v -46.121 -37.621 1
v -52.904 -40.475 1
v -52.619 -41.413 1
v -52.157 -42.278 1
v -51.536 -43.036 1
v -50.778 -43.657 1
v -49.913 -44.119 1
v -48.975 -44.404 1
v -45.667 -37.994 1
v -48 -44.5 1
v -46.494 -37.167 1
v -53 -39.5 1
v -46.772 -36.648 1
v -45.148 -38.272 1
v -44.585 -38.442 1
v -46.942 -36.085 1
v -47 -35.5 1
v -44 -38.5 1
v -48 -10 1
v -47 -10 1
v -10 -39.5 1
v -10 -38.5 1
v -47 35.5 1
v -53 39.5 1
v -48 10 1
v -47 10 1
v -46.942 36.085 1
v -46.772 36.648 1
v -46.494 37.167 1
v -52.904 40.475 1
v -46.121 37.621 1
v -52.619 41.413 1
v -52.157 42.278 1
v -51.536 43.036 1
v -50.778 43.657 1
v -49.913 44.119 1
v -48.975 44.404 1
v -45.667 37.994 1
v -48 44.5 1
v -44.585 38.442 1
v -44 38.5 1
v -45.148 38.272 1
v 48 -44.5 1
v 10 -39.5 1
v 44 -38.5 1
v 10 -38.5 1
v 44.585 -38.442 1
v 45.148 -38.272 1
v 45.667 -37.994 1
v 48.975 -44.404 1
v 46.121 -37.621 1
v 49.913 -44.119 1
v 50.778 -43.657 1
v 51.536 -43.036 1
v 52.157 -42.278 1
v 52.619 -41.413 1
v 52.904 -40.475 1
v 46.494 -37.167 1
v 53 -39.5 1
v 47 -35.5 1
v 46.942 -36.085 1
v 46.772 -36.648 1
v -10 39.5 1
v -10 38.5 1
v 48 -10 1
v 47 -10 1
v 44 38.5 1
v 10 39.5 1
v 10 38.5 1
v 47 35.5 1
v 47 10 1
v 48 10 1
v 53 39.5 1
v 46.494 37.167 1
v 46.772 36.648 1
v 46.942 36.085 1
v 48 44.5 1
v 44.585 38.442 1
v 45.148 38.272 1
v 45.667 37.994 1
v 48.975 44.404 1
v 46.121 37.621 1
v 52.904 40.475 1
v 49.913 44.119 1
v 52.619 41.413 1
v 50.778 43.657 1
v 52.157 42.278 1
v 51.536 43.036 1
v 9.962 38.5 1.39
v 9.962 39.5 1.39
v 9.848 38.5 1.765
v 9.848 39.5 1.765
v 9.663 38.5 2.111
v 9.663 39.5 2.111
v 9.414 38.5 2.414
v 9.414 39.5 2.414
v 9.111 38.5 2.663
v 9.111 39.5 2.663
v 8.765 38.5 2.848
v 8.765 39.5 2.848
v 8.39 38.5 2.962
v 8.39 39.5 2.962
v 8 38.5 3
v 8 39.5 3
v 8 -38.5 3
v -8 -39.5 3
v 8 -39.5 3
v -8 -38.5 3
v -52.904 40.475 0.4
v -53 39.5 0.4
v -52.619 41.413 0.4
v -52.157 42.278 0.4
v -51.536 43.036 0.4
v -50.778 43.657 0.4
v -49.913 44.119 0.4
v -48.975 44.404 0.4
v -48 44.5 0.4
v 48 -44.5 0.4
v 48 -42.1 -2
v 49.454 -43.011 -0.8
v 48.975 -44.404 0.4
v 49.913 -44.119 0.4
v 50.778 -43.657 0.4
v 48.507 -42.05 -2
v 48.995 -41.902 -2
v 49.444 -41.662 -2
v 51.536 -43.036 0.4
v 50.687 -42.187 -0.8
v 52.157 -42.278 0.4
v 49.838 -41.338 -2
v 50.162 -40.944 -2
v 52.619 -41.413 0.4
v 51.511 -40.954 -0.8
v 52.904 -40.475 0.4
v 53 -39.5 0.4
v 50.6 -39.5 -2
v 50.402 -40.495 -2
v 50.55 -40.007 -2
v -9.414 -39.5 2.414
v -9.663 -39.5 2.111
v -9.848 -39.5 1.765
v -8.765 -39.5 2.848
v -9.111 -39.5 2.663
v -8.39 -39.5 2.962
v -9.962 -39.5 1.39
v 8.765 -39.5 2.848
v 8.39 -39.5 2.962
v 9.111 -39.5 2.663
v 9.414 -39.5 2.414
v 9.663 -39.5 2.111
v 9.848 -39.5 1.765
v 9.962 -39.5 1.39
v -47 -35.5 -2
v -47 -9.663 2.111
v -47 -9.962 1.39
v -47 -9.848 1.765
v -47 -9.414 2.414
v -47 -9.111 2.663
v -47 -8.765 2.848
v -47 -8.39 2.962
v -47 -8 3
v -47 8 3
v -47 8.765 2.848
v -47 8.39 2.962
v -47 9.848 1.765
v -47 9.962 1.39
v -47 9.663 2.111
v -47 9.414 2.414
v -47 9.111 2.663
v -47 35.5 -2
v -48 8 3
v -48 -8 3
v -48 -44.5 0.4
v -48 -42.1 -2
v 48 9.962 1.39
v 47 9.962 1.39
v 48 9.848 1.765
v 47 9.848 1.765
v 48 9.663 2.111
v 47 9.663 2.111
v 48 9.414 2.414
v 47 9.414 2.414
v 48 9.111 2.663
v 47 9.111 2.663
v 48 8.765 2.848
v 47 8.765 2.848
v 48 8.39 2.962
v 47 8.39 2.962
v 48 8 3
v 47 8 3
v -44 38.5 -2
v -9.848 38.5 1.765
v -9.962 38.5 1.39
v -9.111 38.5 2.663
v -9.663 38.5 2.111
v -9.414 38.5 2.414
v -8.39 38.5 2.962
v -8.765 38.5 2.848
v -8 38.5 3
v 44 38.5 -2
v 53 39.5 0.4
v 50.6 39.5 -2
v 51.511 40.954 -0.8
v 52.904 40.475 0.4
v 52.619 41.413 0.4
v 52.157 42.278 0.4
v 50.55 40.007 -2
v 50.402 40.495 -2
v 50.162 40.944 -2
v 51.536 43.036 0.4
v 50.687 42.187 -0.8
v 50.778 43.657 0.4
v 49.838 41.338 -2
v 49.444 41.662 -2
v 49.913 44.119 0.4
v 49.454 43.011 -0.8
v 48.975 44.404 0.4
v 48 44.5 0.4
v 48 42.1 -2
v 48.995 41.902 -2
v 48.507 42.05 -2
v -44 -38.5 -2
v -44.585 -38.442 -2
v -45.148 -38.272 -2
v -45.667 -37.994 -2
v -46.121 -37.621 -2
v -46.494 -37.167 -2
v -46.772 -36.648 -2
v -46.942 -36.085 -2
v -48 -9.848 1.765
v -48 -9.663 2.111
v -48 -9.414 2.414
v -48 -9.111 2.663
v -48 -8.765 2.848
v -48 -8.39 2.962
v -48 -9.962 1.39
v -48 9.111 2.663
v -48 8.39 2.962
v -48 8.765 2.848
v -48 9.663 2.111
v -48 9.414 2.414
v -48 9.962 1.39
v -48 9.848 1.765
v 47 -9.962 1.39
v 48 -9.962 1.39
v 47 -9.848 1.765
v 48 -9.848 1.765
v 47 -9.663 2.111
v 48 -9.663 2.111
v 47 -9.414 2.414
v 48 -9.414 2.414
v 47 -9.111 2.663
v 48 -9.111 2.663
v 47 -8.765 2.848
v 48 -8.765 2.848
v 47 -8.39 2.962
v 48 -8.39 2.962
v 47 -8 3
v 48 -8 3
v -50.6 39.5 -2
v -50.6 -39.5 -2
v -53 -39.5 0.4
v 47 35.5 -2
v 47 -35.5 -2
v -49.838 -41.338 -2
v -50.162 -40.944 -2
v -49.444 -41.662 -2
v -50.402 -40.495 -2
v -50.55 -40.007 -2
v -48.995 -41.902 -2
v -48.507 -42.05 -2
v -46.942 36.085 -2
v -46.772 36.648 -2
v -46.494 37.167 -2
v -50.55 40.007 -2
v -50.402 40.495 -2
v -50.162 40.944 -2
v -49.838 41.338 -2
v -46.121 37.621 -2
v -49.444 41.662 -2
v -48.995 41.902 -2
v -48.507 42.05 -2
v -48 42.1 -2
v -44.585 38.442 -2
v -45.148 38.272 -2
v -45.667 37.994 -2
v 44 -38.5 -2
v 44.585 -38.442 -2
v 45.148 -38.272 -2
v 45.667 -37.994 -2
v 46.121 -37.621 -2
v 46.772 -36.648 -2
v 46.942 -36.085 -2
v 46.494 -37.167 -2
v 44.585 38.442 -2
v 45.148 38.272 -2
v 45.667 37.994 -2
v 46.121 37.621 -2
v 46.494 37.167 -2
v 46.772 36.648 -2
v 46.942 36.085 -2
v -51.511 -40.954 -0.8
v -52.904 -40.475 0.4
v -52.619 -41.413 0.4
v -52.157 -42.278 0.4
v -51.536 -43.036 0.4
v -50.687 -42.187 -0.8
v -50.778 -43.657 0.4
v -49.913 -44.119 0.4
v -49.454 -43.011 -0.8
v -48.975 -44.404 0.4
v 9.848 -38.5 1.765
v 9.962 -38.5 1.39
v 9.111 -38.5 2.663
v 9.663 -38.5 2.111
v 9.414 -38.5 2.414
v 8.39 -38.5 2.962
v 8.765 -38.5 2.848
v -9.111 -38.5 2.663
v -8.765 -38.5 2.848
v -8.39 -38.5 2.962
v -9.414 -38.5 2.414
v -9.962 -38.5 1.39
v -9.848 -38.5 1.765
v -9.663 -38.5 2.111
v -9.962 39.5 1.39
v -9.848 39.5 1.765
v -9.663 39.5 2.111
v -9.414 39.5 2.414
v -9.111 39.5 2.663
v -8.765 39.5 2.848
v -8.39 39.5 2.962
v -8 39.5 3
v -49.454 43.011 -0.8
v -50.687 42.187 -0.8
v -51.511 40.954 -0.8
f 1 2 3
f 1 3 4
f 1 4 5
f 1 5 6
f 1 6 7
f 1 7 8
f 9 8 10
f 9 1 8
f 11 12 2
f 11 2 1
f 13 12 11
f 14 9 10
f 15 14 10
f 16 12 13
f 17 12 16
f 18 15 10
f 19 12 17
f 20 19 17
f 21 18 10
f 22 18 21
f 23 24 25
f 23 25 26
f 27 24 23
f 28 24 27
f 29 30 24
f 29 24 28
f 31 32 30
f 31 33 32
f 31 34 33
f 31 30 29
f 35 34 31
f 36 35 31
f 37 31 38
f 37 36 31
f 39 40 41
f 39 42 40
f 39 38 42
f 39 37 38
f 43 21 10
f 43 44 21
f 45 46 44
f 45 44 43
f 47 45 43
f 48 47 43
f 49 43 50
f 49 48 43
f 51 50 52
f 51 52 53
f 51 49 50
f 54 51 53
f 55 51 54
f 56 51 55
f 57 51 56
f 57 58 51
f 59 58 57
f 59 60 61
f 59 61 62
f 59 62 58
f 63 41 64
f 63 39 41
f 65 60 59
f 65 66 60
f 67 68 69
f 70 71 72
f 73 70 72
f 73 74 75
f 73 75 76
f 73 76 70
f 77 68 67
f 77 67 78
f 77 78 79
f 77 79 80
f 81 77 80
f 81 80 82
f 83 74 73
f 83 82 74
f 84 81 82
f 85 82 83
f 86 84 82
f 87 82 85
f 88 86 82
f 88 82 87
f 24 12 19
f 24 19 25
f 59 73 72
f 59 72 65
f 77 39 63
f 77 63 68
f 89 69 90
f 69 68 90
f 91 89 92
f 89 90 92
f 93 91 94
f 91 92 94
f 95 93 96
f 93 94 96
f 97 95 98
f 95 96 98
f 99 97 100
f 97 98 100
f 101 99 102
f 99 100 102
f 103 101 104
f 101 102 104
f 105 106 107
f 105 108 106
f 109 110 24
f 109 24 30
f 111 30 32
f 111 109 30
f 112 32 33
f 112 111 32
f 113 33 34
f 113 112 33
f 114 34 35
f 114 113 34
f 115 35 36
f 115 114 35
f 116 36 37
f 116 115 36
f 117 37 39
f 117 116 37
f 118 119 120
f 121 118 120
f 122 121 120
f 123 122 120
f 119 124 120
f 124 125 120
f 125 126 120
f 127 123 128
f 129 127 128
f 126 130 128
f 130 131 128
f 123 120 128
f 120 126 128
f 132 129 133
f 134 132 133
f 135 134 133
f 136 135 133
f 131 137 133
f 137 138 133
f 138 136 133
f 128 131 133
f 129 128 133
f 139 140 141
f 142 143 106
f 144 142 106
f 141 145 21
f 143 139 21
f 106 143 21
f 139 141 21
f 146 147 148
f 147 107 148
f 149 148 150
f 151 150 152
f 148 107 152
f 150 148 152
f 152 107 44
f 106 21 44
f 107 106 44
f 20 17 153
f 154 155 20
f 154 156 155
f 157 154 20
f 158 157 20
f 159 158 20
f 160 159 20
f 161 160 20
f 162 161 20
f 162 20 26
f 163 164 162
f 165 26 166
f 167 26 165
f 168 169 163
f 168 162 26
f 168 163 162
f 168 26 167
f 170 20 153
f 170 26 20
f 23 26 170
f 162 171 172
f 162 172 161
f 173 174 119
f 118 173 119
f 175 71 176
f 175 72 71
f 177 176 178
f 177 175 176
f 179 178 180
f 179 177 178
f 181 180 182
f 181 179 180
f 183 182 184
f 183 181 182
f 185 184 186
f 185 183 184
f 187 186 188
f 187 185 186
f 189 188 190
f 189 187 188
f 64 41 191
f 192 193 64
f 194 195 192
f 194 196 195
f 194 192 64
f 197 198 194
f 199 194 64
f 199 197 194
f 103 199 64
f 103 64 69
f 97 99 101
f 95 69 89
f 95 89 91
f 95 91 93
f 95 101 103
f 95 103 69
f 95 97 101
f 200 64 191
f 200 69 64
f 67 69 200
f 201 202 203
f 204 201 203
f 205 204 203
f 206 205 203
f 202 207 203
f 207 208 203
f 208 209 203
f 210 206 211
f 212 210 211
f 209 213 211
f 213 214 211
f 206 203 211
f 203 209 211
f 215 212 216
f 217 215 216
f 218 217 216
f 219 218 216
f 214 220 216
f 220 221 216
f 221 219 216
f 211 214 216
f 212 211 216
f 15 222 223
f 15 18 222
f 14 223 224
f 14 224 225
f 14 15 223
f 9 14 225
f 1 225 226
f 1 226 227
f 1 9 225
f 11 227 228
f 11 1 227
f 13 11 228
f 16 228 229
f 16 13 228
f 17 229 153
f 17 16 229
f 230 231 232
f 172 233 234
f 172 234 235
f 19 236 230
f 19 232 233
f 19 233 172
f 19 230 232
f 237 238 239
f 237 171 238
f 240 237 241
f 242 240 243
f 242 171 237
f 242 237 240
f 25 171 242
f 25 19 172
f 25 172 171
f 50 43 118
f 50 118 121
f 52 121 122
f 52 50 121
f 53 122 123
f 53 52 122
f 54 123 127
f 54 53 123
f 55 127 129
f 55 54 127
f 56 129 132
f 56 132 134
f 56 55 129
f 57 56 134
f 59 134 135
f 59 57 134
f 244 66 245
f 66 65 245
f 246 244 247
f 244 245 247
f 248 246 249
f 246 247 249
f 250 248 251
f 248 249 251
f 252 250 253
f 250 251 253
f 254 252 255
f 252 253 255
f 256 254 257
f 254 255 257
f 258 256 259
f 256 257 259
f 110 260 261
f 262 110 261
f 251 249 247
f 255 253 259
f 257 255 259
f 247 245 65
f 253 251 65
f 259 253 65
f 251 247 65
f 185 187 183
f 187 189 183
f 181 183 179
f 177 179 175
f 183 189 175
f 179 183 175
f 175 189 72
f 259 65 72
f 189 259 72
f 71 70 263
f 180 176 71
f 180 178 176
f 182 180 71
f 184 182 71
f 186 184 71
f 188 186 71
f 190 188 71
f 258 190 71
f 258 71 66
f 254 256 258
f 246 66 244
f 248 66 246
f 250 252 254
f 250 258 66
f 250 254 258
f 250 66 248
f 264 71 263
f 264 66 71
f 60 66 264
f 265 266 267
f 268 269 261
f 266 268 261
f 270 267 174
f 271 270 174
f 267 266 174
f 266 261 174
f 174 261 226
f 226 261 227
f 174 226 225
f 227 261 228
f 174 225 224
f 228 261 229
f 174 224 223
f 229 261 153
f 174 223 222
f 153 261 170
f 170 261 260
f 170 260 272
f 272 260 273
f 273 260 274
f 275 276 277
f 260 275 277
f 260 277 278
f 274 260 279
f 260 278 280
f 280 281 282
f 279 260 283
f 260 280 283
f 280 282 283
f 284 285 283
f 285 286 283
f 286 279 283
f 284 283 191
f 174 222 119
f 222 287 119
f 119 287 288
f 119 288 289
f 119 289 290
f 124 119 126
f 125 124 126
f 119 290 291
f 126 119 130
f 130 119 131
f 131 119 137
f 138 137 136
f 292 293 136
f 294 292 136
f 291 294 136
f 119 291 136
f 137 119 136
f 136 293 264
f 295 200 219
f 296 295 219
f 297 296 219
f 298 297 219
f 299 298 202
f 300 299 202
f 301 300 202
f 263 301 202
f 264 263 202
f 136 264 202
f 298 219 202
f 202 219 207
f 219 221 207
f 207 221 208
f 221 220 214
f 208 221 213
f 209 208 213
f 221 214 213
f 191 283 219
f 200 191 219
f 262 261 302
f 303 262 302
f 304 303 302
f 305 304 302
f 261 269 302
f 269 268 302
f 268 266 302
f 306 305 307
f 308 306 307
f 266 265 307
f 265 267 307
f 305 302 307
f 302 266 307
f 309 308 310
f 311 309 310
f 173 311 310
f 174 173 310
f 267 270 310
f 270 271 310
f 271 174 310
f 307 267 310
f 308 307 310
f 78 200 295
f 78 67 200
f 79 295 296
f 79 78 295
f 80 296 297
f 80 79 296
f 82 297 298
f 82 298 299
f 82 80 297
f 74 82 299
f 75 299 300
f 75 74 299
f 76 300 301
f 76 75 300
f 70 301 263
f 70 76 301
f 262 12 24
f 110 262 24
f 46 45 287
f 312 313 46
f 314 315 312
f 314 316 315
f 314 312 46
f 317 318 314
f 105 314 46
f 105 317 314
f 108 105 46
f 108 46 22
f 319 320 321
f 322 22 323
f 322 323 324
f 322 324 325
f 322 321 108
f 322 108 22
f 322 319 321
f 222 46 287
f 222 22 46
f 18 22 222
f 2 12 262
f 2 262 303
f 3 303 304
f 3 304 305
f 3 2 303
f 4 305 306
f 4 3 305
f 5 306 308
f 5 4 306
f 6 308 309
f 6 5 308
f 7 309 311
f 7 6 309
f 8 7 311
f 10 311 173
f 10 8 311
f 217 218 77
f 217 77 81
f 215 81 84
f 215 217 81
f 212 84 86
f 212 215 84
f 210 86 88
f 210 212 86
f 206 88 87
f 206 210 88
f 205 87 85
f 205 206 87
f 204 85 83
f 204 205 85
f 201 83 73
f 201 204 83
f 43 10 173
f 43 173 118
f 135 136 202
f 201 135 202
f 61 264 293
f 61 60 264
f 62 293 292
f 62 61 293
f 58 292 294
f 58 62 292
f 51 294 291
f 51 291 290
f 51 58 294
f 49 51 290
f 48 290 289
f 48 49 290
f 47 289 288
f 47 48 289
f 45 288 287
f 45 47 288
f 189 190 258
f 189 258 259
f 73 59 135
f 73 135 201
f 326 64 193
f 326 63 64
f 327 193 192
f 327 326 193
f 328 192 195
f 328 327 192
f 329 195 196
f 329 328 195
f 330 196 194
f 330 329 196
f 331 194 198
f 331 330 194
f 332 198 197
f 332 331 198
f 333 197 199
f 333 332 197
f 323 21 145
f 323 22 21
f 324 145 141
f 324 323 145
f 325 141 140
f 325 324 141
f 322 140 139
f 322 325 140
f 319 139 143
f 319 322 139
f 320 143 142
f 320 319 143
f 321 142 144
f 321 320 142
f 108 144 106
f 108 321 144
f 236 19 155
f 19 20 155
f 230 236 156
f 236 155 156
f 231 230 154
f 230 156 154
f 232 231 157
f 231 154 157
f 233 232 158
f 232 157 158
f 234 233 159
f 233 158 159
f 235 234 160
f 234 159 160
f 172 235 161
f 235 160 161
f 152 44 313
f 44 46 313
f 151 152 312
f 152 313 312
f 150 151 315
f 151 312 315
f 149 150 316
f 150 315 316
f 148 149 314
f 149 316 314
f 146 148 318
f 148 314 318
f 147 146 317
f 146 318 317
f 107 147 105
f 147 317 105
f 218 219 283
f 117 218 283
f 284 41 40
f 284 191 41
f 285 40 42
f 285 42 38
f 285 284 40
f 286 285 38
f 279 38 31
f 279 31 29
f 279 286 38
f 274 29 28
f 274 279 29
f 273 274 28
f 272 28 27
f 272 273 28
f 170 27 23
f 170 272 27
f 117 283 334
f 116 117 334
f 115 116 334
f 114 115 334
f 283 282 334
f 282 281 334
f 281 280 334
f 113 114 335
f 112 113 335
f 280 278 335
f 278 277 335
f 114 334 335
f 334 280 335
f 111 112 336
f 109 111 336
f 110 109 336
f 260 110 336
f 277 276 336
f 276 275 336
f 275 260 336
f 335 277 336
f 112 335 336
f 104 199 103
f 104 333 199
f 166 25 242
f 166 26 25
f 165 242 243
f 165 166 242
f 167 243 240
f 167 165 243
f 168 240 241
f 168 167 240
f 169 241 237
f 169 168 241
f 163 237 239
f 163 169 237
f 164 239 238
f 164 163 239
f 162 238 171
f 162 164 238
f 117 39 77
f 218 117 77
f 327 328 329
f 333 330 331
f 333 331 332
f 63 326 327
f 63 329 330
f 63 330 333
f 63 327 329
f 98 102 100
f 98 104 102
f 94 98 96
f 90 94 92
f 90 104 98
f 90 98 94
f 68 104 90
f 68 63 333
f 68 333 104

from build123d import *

# Parameters (mm, degrees)
F0_W     = 106
F0_H     = 89
F1_DEPTH = 1
F0_W_2   = 20
F0_H_2   = 1
F0_W_3   = 1
F0_H_3   = 20
F2_DEPTH = 3
F3_DEPTH = 2
F4_R     = 3
F5_R     = 5
F6_SIZE2 = 2.4
F6_SIZE  = 2.4
F7_R     = 1.99999


# Not quite as in the source:
# - a fillet or chamfer is up to 0.001 mm smaller than in the source, because OpenCascade refuses the exact size


with BuildPart() as f1:
    # F0 (on Top) → F1 (new body)
    with BuildSketch(Plane.XY):
        Rectangle(F0_W, F0_H)
        Polygon((-47, 10), (-47, 38.5), (-10, 38.5), (-10, 39.5), (10, 39.5), (10, 38.5), (47, 38.5), (47, 10), (48, 10), (48, -10), (47, -10), (47, -38.5), (10, -38.5), (10, -39.5), (-10, -39.5), (-10, -38.5), (-47, -38.5), (-47, -10), (-48, -10), (-48, 10), align=None, mode=Mode.SUBTRACT)
    extrude(amount=F1_DEPTH)

    # F0 (on Top) → F2 (join)
    with BuildSketch(Plane.XY):
        with Locations((0, 39)):
            Rectangle(F0_W_2, F0_H_2)
        with Locations((-47.5, 0)):
            Rectangle(F0_W_3, F0_H_3)
        with Locations((47.5, 0)):
            Rectangle(F0_W_3, F0_H_3)
        with Locations((0, -39)):
            Rectangle(F0_W_2, F0_H_2)
    extrude(amount=F2_DEPTH)

    # F0 (on Top) → F3 (join)
    with BuildSketch(Plane.XY):
        Rectangle(F0_W, F0_H)
        Polygon((-47, 10), (-47, 38.5), (-10, 38.5), (-10, 39.5), (10, 39.5), (10, 38.5), (47, 38.5), (47, 10), (48, 10), (48, -10), (47, -10), (47, -38.5), (10, -38.5), (10, -39.5), (-10, -39.5), (-10, -38.5), (-47, -38.5), (-47, -10), (-48, -10), (-48, 10), align=None, mode=Mode.SUBTRACT)
        with Locations((0, 39)):
            Rectangle(F0_W_2, F0_H_2)
        with Locations((47.5, 0)):
            Rectangle(F0_W_3, F0_H_3)
        with Locations((-47.5, 0)):
            Rectangle(F0_W_3, F0_H_3)
        with Locations((0, -39)):
            Rectangle(F0_W_2, F0_H_2)
    extrude(amount=-F3_DEPTH)

    # F4
    f4_edges = [f1.edges().sort_by_distance(p)[0] for p in [
        (47, 38.5, -0.5),
        (47, -38.5, -0.5),
        (-47, 38.5, -0.5),
        (-47, -38.5, -0.5),
    ]]
    fillet(f4_edges, radius=F4_R)

    # F5
    f5_edges = [f1.edges().sort_by_distance(p)[0] for p in [
        (-53, -44.5, -0.5),
        (53, -44.5, -0.5),
        (-53, 44.5, -0.5),
        (53, 44.5, -0.5),
    ]]
    fillet(f5_edges, radius=F5_R)

    # F6
    f6_edges = [f1.edges().sort_by_distance(p)[0] for p in [
        (0, -44.5, -2),
    ]]
    chamfer(f6_edges, length=F6_SIZE, length2=F6_SIZE2)

    # F7 (radius 2 in the source; OpenCascade refuses exactly that, so slightly less here)
    f7_edges = [f1.edges().sort_by_distance(p)[0] for p in [
        (10, -39, 3),
        (-10, -39, 3),
        (-47.5, -10, 3),
        (-47.5, 10, 3),
        (-10, 39, 3),
        (10, 39, 3),
        (47.5, 10, 3),
        (47.5, -10, 3),
    ]]
    fillet(f7_edges, radius=F7_R)


solid = f1.part
